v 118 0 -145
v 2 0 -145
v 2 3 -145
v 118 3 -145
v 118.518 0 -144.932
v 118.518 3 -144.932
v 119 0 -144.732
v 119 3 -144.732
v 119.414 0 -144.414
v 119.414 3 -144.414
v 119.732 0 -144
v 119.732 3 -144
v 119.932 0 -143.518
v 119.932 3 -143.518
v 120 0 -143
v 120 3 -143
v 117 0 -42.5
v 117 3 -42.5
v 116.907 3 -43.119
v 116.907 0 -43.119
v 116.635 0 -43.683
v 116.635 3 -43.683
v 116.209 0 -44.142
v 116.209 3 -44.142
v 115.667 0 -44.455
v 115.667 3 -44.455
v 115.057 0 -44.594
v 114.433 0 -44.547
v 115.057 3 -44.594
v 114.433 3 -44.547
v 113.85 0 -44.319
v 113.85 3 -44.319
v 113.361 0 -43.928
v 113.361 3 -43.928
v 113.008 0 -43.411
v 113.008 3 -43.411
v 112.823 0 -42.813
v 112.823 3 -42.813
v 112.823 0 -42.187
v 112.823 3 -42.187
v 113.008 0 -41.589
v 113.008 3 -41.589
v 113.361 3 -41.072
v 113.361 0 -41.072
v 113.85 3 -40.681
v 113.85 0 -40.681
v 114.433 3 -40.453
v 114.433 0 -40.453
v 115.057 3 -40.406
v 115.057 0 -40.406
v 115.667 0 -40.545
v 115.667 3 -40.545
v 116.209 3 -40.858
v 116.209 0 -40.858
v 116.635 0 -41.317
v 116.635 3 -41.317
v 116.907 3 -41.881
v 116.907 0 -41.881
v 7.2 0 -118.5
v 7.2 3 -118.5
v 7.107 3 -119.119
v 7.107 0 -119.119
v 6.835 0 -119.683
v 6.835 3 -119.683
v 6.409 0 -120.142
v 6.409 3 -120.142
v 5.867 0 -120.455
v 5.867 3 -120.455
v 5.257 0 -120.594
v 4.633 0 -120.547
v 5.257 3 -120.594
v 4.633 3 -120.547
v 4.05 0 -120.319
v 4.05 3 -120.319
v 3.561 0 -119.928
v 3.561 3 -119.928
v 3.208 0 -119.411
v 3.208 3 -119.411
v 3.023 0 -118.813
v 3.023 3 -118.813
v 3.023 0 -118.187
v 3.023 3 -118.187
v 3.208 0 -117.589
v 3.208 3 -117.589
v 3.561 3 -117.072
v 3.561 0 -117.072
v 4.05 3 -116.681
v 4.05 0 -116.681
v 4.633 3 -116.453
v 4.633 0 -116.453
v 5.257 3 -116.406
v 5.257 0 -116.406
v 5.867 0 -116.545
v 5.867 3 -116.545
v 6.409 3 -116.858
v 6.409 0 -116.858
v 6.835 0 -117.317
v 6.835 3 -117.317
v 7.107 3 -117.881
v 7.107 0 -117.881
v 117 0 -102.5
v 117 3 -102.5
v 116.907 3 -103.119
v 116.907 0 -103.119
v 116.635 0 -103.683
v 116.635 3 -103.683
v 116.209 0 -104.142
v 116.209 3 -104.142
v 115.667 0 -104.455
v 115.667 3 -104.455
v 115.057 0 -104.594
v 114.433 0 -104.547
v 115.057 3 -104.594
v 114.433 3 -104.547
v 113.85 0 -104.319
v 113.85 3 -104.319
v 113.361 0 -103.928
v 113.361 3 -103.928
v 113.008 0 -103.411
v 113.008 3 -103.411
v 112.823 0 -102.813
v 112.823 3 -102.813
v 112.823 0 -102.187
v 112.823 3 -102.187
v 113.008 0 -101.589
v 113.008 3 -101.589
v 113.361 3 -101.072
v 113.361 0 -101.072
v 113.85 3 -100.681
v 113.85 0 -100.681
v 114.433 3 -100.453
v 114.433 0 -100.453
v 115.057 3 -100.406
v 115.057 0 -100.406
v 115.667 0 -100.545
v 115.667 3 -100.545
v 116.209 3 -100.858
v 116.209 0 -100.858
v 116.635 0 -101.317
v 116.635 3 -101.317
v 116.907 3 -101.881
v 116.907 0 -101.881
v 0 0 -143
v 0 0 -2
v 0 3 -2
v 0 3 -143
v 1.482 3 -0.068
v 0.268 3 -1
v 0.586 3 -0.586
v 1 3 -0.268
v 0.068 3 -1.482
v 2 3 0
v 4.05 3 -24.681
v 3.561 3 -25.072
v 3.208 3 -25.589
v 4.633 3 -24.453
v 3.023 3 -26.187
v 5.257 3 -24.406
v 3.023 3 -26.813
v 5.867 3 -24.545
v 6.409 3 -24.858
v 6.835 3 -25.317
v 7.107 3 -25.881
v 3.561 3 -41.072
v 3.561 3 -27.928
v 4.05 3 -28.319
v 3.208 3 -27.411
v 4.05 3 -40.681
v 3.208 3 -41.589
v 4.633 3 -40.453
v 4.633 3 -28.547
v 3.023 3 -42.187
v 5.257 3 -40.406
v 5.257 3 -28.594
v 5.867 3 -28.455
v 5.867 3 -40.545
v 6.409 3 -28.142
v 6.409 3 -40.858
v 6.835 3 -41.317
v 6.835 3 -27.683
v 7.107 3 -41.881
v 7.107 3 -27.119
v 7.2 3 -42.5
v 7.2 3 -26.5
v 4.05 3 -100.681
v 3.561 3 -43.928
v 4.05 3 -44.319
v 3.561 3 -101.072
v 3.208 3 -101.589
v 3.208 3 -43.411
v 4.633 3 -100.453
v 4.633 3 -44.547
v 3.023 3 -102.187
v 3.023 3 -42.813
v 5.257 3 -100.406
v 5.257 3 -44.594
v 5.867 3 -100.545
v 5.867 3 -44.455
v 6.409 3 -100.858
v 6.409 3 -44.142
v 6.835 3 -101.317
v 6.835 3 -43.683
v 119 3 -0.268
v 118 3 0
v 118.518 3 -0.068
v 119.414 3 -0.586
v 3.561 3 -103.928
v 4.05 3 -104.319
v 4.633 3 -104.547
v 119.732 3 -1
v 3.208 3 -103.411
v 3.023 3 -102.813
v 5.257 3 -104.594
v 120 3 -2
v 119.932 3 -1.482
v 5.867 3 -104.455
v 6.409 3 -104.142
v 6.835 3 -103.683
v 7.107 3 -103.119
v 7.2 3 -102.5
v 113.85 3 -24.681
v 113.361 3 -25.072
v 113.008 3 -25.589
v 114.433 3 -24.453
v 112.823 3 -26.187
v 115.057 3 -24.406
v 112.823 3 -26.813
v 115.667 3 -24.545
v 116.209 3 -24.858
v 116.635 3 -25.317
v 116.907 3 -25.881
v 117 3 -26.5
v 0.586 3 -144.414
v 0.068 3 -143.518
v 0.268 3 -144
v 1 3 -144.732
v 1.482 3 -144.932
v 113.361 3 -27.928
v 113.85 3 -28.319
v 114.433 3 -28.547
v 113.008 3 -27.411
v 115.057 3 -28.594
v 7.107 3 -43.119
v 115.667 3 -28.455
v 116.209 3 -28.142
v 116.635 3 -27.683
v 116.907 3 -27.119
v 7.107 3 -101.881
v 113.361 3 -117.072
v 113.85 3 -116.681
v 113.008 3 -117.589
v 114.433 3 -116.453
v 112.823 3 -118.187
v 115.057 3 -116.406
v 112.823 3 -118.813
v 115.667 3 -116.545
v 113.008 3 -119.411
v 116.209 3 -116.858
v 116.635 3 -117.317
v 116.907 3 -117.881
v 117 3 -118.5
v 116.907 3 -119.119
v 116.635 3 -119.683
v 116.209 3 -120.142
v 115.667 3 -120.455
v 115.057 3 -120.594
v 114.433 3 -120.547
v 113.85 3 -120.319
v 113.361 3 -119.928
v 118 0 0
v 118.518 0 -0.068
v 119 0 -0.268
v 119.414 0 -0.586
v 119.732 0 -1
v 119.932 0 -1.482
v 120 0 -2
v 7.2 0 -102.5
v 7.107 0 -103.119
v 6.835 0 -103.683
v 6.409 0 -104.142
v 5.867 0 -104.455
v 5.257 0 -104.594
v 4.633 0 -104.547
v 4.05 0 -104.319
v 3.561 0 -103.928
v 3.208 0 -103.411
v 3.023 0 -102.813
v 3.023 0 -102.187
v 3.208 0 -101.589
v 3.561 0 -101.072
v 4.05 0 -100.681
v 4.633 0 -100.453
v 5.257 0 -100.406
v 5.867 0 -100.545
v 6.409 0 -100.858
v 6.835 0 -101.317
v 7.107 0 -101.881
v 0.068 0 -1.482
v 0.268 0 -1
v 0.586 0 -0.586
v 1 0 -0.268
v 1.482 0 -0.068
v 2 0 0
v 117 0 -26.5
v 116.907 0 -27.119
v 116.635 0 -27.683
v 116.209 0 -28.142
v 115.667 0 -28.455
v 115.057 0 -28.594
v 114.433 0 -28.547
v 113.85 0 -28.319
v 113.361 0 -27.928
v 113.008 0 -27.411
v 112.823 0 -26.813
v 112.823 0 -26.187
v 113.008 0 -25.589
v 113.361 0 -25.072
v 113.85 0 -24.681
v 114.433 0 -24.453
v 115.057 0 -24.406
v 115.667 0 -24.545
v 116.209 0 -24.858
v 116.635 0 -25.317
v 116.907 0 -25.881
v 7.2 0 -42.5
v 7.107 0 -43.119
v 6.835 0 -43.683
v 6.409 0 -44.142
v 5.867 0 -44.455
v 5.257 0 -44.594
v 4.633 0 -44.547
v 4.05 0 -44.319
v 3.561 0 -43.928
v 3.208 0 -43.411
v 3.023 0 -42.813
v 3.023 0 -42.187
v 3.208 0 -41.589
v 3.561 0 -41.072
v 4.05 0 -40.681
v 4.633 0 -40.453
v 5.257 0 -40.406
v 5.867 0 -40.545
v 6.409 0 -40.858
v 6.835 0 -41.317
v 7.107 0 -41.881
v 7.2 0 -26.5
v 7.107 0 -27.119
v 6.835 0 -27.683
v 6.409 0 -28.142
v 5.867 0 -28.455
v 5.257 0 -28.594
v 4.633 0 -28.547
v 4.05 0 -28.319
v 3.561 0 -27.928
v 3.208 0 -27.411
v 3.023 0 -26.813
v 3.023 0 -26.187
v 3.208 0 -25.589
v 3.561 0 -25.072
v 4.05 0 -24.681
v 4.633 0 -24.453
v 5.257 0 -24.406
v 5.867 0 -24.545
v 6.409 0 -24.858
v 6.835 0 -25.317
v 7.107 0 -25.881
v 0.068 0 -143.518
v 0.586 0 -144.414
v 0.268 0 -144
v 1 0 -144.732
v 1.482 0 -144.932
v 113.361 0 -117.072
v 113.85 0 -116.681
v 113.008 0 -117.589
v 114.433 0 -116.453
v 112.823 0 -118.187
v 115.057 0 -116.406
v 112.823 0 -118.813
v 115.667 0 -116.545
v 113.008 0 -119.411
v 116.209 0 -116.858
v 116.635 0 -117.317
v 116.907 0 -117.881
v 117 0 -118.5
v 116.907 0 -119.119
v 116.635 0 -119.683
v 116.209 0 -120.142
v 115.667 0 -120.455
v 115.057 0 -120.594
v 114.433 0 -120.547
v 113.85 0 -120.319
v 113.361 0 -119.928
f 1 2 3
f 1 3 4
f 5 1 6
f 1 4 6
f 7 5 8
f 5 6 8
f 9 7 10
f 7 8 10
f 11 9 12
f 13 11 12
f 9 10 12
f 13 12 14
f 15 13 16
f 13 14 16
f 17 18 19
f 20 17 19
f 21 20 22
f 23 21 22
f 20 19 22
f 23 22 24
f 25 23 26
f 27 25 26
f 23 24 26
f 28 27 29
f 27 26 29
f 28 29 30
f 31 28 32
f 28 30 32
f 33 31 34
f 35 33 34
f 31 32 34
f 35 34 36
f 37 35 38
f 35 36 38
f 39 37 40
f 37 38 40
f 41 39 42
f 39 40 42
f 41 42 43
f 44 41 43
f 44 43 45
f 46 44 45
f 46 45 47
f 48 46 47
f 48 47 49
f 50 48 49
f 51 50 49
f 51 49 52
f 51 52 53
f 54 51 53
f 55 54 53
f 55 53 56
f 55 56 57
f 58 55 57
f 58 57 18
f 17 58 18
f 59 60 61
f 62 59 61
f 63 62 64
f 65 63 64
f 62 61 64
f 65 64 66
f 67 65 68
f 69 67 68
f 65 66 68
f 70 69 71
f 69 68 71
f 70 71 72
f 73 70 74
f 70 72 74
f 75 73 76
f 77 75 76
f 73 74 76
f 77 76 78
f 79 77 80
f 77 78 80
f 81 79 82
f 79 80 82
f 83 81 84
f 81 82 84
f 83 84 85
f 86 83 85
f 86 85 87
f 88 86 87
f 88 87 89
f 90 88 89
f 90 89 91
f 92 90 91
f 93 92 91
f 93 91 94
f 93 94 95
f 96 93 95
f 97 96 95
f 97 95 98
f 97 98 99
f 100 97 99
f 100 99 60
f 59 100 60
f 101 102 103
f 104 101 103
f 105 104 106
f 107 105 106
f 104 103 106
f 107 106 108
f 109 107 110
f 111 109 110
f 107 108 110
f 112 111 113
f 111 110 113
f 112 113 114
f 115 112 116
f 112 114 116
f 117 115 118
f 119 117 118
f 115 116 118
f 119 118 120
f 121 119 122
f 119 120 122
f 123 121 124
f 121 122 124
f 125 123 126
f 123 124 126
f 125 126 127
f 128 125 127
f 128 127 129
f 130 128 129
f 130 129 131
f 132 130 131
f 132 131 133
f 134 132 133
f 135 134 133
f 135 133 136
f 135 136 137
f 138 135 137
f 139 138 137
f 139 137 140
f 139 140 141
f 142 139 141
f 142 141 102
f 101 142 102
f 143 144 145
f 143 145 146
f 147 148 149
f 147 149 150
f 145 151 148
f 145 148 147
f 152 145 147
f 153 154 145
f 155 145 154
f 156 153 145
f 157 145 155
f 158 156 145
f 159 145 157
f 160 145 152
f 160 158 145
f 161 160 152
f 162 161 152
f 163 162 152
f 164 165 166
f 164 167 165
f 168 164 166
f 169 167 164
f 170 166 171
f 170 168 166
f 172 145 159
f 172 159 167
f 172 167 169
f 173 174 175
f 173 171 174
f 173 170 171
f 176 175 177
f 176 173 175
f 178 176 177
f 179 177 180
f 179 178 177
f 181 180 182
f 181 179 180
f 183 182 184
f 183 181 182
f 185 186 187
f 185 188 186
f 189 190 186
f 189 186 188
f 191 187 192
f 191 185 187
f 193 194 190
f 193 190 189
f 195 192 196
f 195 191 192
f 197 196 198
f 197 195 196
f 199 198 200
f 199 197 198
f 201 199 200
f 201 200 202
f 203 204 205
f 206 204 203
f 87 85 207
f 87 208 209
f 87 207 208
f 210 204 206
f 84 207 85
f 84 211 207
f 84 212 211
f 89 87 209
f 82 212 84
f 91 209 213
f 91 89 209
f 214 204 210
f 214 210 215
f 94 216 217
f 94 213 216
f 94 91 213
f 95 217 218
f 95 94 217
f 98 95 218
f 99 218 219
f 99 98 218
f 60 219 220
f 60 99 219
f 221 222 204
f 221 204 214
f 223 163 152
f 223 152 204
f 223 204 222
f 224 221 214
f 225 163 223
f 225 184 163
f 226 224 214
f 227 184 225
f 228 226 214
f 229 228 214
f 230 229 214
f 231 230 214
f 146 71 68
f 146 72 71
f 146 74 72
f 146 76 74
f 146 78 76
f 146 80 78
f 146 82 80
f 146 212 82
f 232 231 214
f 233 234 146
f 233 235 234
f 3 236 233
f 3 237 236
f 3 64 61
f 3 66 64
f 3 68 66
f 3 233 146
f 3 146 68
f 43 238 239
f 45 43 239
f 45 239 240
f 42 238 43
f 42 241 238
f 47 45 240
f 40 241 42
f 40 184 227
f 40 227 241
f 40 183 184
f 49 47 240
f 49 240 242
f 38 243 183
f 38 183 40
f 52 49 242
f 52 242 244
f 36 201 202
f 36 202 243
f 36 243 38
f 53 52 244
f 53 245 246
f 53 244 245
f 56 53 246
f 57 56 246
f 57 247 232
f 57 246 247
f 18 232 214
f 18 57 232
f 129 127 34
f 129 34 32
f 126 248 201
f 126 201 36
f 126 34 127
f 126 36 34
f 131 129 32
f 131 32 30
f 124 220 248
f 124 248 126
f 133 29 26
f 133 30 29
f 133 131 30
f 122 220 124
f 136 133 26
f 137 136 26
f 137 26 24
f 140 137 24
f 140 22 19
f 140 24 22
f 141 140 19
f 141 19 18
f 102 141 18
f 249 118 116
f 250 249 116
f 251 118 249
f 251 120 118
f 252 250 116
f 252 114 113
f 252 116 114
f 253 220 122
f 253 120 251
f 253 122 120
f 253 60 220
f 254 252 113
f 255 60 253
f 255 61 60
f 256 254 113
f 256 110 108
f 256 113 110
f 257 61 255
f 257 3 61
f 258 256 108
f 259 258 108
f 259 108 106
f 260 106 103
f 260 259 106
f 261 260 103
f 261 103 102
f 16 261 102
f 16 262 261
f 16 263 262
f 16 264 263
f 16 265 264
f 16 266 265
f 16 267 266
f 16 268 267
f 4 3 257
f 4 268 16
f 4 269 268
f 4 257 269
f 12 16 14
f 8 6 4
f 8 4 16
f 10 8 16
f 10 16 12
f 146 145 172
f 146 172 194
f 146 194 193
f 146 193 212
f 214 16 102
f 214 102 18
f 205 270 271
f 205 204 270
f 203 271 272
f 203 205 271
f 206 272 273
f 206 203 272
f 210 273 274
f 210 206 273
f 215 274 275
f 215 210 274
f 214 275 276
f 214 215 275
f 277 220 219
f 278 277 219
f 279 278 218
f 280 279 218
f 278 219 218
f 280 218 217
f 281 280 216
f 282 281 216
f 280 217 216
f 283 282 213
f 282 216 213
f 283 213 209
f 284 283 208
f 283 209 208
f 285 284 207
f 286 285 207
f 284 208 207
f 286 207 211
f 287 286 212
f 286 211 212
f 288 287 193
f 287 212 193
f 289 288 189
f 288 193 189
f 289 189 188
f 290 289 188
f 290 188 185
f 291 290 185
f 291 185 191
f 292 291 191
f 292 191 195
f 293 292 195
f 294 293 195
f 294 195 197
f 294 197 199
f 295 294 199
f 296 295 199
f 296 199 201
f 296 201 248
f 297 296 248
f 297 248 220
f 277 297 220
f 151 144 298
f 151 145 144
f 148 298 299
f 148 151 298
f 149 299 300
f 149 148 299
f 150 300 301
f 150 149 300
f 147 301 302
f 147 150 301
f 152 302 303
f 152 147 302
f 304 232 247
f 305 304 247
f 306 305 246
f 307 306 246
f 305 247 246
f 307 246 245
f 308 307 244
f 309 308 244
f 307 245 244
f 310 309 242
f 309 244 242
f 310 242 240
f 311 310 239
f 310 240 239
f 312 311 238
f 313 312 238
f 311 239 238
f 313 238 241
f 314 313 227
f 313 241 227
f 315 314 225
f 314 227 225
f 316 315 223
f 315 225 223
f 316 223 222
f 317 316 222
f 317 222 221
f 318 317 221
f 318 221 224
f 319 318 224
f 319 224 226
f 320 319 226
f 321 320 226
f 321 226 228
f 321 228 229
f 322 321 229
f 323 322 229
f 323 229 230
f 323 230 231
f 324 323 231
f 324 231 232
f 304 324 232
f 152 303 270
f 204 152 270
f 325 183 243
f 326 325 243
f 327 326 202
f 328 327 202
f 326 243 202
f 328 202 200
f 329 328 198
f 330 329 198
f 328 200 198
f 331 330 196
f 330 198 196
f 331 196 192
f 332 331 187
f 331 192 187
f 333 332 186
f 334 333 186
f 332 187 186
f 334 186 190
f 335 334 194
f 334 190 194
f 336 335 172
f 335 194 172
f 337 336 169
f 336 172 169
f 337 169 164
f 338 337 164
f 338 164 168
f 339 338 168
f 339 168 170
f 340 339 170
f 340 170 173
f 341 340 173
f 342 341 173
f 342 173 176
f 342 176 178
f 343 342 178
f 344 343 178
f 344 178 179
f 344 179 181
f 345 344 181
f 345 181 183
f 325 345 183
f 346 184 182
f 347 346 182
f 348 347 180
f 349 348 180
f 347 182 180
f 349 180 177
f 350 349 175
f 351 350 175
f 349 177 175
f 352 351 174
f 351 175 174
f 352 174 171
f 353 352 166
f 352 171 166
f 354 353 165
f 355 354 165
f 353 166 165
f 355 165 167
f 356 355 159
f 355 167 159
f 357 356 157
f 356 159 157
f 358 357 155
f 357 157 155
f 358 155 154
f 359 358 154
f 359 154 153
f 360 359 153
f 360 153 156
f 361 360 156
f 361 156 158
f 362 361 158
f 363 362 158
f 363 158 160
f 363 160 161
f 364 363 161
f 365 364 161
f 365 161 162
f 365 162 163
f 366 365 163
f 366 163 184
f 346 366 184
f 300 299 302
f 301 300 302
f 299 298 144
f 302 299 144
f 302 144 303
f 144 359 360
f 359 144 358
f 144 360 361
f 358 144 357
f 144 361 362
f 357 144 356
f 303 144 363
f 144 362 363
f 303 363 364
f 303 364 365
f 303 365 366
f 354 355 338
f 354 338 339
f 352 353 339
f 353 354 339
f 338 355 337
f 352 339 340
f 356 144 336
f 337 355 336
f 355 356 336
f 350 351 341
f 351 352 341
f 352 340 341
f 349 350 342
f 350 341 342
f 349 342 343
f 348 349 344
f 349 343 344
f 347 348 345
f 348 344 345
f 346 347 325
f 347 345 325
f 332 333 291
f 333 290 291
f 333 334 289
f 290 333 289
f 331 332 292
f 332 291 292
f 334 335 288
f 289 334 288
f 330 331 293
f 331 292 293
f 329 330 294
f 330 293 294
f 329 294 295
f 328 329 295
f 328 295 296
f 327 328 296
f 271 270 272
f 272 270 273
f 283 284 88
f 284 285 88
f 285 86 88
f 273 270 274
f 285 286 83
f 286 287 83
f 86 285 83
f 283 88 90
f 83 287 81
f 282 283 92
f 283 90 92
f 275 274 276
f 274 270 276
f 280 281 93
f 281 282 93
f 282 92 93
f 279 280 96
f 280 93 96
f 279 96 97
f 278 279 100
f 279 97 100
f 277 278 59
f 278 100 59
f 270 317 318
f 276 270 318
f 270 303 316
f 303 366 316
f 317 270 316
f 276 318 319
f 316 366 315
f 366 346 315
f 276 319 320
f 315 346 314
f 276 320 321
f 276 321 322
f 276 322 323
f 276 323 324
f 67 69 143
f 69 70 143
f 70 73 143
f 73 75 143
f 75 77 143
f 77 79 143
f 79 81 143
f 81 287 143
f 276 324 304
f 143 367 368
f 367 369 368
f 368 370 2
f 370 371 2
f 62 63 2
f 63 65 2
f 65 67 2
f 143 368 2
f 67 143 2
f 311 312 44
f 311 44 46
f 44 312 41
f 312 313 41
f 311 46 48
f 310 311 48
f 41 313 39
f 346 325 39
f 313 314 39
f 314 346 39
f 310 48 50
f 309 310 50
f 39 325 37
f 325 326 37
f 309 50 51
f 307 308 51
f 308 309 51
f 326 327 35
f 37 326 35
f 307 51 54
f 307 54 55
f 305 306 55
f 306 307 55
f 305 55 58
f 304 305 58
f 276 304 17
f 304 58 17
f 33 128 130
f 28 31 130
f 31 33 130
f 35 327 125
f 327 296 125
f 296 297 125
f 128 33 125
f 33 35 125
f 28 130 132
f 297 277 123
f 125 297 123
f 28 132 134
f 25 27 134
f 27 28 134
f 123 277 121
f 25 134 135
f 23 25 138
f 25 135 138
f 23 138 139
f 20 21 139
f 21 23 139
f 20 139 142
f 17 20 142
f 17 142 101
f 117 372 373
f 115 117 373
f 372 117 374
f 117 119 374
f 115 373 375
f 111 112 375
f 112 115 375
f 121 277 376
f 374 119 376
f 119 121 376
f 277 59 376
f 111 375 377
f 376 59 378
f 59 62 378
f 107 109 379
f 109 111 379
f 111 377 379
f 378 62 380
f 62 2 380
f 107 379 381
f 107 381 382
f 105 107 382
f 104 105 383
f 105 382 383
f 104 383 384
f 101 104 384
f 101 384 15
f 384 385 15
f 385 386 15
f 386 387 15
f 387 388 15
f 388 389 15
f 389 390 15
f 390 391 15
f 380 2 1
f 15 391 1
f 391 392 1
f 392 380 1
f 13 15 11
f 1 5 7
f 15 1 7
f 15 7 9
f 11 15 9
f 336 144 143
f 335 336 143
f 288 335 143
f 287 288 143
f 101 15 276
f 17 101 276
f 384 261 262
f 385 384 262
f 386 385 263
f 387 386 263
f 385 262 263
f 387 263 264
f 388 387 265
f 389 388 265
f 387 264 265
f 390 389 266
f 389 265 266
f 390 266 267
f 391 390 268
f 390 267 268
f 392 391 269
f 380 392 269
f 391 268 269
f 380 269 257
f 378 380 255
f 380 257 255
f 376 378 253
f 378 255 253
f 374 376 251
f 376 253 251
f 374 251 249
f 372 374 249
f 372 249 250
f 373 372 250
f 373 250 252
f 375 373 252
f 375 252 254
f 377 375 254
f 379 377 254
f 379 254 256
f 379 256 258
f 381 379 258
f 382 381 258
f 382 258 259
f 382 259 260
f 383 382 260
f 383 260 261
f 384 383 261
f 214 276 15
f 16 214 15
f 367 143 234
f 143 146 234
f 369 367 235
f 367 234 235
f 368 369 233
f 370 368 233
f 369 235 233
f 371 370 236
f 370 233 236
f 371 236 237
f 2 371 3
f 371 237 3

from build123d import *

# Parameters (mm, degrees)
SKETCH1_W           = 120
SKETCH1_H           = 145
BOSS_EXTRUDE1_DEPTH = 3
SKETCH2_R           = 2.1
CUT_EXTRUDE1_DEPTH  = 4
FILLET1_R           = 2


with BuildPart() as part:
    # Sketch1 → Boss-Extrude1 (new body)
    with BuildSketch(Plane(origin=(0, 0, 0), x_dir=(1, 0, 0), z_dir=(0, 1, 0))):
        with Locations((60, 72.5)):
            Rectangle(SKETCH1_W, SKETCH1_H)
    extrude(amount=BOSS_EXTRUDE1_DEPTH)

    # Sketch2 → Cut-Extrude1 (cut, through all)
    with BuildSketch(Plane(origin=(0, 3, 3), x_dir=(1, 0, 0), z_dir=(0, 1, 0))):
        with Locations((5.1, 121.5)):
            Circle(SKETCH2_R)
        with Locations((5.1, 105.5)):
            Circle(SKETCH2_R)
        with Locations((5.1, 45.5)):
            Circle(SKETCH2_R)
        with Locations((5.1, 29.5)):
            Circle(SKETCH2_R)
        with Locations((114.9, 29.5)):
            Circle(SKETCH2_R)
        with Locations((114.9, 45.5)):
            Circle(SKETCH2_R)
        with Locations((114.9, 105.5)):
            Circle(SKETCH2_R)
        with Locations((114.9, 121.5)):
            Circle(SKETCH2_R)
    extrude(amount=-CUT_EXTRUDE1_DEPTH, mode=Mode.SUBTRACT)

    # Fillet1
    fillet1_edges = [part.edges().sort_by_distance(p)[0] for p in [
        (0, 1.5, -145),
        (120, 1.5, -145),
        (120, 1.5, 0),
        (0, 1.5, 0),
    ]]
    fillet(fillet1_edges, radius=FILLET1_R)


solid = part.part
